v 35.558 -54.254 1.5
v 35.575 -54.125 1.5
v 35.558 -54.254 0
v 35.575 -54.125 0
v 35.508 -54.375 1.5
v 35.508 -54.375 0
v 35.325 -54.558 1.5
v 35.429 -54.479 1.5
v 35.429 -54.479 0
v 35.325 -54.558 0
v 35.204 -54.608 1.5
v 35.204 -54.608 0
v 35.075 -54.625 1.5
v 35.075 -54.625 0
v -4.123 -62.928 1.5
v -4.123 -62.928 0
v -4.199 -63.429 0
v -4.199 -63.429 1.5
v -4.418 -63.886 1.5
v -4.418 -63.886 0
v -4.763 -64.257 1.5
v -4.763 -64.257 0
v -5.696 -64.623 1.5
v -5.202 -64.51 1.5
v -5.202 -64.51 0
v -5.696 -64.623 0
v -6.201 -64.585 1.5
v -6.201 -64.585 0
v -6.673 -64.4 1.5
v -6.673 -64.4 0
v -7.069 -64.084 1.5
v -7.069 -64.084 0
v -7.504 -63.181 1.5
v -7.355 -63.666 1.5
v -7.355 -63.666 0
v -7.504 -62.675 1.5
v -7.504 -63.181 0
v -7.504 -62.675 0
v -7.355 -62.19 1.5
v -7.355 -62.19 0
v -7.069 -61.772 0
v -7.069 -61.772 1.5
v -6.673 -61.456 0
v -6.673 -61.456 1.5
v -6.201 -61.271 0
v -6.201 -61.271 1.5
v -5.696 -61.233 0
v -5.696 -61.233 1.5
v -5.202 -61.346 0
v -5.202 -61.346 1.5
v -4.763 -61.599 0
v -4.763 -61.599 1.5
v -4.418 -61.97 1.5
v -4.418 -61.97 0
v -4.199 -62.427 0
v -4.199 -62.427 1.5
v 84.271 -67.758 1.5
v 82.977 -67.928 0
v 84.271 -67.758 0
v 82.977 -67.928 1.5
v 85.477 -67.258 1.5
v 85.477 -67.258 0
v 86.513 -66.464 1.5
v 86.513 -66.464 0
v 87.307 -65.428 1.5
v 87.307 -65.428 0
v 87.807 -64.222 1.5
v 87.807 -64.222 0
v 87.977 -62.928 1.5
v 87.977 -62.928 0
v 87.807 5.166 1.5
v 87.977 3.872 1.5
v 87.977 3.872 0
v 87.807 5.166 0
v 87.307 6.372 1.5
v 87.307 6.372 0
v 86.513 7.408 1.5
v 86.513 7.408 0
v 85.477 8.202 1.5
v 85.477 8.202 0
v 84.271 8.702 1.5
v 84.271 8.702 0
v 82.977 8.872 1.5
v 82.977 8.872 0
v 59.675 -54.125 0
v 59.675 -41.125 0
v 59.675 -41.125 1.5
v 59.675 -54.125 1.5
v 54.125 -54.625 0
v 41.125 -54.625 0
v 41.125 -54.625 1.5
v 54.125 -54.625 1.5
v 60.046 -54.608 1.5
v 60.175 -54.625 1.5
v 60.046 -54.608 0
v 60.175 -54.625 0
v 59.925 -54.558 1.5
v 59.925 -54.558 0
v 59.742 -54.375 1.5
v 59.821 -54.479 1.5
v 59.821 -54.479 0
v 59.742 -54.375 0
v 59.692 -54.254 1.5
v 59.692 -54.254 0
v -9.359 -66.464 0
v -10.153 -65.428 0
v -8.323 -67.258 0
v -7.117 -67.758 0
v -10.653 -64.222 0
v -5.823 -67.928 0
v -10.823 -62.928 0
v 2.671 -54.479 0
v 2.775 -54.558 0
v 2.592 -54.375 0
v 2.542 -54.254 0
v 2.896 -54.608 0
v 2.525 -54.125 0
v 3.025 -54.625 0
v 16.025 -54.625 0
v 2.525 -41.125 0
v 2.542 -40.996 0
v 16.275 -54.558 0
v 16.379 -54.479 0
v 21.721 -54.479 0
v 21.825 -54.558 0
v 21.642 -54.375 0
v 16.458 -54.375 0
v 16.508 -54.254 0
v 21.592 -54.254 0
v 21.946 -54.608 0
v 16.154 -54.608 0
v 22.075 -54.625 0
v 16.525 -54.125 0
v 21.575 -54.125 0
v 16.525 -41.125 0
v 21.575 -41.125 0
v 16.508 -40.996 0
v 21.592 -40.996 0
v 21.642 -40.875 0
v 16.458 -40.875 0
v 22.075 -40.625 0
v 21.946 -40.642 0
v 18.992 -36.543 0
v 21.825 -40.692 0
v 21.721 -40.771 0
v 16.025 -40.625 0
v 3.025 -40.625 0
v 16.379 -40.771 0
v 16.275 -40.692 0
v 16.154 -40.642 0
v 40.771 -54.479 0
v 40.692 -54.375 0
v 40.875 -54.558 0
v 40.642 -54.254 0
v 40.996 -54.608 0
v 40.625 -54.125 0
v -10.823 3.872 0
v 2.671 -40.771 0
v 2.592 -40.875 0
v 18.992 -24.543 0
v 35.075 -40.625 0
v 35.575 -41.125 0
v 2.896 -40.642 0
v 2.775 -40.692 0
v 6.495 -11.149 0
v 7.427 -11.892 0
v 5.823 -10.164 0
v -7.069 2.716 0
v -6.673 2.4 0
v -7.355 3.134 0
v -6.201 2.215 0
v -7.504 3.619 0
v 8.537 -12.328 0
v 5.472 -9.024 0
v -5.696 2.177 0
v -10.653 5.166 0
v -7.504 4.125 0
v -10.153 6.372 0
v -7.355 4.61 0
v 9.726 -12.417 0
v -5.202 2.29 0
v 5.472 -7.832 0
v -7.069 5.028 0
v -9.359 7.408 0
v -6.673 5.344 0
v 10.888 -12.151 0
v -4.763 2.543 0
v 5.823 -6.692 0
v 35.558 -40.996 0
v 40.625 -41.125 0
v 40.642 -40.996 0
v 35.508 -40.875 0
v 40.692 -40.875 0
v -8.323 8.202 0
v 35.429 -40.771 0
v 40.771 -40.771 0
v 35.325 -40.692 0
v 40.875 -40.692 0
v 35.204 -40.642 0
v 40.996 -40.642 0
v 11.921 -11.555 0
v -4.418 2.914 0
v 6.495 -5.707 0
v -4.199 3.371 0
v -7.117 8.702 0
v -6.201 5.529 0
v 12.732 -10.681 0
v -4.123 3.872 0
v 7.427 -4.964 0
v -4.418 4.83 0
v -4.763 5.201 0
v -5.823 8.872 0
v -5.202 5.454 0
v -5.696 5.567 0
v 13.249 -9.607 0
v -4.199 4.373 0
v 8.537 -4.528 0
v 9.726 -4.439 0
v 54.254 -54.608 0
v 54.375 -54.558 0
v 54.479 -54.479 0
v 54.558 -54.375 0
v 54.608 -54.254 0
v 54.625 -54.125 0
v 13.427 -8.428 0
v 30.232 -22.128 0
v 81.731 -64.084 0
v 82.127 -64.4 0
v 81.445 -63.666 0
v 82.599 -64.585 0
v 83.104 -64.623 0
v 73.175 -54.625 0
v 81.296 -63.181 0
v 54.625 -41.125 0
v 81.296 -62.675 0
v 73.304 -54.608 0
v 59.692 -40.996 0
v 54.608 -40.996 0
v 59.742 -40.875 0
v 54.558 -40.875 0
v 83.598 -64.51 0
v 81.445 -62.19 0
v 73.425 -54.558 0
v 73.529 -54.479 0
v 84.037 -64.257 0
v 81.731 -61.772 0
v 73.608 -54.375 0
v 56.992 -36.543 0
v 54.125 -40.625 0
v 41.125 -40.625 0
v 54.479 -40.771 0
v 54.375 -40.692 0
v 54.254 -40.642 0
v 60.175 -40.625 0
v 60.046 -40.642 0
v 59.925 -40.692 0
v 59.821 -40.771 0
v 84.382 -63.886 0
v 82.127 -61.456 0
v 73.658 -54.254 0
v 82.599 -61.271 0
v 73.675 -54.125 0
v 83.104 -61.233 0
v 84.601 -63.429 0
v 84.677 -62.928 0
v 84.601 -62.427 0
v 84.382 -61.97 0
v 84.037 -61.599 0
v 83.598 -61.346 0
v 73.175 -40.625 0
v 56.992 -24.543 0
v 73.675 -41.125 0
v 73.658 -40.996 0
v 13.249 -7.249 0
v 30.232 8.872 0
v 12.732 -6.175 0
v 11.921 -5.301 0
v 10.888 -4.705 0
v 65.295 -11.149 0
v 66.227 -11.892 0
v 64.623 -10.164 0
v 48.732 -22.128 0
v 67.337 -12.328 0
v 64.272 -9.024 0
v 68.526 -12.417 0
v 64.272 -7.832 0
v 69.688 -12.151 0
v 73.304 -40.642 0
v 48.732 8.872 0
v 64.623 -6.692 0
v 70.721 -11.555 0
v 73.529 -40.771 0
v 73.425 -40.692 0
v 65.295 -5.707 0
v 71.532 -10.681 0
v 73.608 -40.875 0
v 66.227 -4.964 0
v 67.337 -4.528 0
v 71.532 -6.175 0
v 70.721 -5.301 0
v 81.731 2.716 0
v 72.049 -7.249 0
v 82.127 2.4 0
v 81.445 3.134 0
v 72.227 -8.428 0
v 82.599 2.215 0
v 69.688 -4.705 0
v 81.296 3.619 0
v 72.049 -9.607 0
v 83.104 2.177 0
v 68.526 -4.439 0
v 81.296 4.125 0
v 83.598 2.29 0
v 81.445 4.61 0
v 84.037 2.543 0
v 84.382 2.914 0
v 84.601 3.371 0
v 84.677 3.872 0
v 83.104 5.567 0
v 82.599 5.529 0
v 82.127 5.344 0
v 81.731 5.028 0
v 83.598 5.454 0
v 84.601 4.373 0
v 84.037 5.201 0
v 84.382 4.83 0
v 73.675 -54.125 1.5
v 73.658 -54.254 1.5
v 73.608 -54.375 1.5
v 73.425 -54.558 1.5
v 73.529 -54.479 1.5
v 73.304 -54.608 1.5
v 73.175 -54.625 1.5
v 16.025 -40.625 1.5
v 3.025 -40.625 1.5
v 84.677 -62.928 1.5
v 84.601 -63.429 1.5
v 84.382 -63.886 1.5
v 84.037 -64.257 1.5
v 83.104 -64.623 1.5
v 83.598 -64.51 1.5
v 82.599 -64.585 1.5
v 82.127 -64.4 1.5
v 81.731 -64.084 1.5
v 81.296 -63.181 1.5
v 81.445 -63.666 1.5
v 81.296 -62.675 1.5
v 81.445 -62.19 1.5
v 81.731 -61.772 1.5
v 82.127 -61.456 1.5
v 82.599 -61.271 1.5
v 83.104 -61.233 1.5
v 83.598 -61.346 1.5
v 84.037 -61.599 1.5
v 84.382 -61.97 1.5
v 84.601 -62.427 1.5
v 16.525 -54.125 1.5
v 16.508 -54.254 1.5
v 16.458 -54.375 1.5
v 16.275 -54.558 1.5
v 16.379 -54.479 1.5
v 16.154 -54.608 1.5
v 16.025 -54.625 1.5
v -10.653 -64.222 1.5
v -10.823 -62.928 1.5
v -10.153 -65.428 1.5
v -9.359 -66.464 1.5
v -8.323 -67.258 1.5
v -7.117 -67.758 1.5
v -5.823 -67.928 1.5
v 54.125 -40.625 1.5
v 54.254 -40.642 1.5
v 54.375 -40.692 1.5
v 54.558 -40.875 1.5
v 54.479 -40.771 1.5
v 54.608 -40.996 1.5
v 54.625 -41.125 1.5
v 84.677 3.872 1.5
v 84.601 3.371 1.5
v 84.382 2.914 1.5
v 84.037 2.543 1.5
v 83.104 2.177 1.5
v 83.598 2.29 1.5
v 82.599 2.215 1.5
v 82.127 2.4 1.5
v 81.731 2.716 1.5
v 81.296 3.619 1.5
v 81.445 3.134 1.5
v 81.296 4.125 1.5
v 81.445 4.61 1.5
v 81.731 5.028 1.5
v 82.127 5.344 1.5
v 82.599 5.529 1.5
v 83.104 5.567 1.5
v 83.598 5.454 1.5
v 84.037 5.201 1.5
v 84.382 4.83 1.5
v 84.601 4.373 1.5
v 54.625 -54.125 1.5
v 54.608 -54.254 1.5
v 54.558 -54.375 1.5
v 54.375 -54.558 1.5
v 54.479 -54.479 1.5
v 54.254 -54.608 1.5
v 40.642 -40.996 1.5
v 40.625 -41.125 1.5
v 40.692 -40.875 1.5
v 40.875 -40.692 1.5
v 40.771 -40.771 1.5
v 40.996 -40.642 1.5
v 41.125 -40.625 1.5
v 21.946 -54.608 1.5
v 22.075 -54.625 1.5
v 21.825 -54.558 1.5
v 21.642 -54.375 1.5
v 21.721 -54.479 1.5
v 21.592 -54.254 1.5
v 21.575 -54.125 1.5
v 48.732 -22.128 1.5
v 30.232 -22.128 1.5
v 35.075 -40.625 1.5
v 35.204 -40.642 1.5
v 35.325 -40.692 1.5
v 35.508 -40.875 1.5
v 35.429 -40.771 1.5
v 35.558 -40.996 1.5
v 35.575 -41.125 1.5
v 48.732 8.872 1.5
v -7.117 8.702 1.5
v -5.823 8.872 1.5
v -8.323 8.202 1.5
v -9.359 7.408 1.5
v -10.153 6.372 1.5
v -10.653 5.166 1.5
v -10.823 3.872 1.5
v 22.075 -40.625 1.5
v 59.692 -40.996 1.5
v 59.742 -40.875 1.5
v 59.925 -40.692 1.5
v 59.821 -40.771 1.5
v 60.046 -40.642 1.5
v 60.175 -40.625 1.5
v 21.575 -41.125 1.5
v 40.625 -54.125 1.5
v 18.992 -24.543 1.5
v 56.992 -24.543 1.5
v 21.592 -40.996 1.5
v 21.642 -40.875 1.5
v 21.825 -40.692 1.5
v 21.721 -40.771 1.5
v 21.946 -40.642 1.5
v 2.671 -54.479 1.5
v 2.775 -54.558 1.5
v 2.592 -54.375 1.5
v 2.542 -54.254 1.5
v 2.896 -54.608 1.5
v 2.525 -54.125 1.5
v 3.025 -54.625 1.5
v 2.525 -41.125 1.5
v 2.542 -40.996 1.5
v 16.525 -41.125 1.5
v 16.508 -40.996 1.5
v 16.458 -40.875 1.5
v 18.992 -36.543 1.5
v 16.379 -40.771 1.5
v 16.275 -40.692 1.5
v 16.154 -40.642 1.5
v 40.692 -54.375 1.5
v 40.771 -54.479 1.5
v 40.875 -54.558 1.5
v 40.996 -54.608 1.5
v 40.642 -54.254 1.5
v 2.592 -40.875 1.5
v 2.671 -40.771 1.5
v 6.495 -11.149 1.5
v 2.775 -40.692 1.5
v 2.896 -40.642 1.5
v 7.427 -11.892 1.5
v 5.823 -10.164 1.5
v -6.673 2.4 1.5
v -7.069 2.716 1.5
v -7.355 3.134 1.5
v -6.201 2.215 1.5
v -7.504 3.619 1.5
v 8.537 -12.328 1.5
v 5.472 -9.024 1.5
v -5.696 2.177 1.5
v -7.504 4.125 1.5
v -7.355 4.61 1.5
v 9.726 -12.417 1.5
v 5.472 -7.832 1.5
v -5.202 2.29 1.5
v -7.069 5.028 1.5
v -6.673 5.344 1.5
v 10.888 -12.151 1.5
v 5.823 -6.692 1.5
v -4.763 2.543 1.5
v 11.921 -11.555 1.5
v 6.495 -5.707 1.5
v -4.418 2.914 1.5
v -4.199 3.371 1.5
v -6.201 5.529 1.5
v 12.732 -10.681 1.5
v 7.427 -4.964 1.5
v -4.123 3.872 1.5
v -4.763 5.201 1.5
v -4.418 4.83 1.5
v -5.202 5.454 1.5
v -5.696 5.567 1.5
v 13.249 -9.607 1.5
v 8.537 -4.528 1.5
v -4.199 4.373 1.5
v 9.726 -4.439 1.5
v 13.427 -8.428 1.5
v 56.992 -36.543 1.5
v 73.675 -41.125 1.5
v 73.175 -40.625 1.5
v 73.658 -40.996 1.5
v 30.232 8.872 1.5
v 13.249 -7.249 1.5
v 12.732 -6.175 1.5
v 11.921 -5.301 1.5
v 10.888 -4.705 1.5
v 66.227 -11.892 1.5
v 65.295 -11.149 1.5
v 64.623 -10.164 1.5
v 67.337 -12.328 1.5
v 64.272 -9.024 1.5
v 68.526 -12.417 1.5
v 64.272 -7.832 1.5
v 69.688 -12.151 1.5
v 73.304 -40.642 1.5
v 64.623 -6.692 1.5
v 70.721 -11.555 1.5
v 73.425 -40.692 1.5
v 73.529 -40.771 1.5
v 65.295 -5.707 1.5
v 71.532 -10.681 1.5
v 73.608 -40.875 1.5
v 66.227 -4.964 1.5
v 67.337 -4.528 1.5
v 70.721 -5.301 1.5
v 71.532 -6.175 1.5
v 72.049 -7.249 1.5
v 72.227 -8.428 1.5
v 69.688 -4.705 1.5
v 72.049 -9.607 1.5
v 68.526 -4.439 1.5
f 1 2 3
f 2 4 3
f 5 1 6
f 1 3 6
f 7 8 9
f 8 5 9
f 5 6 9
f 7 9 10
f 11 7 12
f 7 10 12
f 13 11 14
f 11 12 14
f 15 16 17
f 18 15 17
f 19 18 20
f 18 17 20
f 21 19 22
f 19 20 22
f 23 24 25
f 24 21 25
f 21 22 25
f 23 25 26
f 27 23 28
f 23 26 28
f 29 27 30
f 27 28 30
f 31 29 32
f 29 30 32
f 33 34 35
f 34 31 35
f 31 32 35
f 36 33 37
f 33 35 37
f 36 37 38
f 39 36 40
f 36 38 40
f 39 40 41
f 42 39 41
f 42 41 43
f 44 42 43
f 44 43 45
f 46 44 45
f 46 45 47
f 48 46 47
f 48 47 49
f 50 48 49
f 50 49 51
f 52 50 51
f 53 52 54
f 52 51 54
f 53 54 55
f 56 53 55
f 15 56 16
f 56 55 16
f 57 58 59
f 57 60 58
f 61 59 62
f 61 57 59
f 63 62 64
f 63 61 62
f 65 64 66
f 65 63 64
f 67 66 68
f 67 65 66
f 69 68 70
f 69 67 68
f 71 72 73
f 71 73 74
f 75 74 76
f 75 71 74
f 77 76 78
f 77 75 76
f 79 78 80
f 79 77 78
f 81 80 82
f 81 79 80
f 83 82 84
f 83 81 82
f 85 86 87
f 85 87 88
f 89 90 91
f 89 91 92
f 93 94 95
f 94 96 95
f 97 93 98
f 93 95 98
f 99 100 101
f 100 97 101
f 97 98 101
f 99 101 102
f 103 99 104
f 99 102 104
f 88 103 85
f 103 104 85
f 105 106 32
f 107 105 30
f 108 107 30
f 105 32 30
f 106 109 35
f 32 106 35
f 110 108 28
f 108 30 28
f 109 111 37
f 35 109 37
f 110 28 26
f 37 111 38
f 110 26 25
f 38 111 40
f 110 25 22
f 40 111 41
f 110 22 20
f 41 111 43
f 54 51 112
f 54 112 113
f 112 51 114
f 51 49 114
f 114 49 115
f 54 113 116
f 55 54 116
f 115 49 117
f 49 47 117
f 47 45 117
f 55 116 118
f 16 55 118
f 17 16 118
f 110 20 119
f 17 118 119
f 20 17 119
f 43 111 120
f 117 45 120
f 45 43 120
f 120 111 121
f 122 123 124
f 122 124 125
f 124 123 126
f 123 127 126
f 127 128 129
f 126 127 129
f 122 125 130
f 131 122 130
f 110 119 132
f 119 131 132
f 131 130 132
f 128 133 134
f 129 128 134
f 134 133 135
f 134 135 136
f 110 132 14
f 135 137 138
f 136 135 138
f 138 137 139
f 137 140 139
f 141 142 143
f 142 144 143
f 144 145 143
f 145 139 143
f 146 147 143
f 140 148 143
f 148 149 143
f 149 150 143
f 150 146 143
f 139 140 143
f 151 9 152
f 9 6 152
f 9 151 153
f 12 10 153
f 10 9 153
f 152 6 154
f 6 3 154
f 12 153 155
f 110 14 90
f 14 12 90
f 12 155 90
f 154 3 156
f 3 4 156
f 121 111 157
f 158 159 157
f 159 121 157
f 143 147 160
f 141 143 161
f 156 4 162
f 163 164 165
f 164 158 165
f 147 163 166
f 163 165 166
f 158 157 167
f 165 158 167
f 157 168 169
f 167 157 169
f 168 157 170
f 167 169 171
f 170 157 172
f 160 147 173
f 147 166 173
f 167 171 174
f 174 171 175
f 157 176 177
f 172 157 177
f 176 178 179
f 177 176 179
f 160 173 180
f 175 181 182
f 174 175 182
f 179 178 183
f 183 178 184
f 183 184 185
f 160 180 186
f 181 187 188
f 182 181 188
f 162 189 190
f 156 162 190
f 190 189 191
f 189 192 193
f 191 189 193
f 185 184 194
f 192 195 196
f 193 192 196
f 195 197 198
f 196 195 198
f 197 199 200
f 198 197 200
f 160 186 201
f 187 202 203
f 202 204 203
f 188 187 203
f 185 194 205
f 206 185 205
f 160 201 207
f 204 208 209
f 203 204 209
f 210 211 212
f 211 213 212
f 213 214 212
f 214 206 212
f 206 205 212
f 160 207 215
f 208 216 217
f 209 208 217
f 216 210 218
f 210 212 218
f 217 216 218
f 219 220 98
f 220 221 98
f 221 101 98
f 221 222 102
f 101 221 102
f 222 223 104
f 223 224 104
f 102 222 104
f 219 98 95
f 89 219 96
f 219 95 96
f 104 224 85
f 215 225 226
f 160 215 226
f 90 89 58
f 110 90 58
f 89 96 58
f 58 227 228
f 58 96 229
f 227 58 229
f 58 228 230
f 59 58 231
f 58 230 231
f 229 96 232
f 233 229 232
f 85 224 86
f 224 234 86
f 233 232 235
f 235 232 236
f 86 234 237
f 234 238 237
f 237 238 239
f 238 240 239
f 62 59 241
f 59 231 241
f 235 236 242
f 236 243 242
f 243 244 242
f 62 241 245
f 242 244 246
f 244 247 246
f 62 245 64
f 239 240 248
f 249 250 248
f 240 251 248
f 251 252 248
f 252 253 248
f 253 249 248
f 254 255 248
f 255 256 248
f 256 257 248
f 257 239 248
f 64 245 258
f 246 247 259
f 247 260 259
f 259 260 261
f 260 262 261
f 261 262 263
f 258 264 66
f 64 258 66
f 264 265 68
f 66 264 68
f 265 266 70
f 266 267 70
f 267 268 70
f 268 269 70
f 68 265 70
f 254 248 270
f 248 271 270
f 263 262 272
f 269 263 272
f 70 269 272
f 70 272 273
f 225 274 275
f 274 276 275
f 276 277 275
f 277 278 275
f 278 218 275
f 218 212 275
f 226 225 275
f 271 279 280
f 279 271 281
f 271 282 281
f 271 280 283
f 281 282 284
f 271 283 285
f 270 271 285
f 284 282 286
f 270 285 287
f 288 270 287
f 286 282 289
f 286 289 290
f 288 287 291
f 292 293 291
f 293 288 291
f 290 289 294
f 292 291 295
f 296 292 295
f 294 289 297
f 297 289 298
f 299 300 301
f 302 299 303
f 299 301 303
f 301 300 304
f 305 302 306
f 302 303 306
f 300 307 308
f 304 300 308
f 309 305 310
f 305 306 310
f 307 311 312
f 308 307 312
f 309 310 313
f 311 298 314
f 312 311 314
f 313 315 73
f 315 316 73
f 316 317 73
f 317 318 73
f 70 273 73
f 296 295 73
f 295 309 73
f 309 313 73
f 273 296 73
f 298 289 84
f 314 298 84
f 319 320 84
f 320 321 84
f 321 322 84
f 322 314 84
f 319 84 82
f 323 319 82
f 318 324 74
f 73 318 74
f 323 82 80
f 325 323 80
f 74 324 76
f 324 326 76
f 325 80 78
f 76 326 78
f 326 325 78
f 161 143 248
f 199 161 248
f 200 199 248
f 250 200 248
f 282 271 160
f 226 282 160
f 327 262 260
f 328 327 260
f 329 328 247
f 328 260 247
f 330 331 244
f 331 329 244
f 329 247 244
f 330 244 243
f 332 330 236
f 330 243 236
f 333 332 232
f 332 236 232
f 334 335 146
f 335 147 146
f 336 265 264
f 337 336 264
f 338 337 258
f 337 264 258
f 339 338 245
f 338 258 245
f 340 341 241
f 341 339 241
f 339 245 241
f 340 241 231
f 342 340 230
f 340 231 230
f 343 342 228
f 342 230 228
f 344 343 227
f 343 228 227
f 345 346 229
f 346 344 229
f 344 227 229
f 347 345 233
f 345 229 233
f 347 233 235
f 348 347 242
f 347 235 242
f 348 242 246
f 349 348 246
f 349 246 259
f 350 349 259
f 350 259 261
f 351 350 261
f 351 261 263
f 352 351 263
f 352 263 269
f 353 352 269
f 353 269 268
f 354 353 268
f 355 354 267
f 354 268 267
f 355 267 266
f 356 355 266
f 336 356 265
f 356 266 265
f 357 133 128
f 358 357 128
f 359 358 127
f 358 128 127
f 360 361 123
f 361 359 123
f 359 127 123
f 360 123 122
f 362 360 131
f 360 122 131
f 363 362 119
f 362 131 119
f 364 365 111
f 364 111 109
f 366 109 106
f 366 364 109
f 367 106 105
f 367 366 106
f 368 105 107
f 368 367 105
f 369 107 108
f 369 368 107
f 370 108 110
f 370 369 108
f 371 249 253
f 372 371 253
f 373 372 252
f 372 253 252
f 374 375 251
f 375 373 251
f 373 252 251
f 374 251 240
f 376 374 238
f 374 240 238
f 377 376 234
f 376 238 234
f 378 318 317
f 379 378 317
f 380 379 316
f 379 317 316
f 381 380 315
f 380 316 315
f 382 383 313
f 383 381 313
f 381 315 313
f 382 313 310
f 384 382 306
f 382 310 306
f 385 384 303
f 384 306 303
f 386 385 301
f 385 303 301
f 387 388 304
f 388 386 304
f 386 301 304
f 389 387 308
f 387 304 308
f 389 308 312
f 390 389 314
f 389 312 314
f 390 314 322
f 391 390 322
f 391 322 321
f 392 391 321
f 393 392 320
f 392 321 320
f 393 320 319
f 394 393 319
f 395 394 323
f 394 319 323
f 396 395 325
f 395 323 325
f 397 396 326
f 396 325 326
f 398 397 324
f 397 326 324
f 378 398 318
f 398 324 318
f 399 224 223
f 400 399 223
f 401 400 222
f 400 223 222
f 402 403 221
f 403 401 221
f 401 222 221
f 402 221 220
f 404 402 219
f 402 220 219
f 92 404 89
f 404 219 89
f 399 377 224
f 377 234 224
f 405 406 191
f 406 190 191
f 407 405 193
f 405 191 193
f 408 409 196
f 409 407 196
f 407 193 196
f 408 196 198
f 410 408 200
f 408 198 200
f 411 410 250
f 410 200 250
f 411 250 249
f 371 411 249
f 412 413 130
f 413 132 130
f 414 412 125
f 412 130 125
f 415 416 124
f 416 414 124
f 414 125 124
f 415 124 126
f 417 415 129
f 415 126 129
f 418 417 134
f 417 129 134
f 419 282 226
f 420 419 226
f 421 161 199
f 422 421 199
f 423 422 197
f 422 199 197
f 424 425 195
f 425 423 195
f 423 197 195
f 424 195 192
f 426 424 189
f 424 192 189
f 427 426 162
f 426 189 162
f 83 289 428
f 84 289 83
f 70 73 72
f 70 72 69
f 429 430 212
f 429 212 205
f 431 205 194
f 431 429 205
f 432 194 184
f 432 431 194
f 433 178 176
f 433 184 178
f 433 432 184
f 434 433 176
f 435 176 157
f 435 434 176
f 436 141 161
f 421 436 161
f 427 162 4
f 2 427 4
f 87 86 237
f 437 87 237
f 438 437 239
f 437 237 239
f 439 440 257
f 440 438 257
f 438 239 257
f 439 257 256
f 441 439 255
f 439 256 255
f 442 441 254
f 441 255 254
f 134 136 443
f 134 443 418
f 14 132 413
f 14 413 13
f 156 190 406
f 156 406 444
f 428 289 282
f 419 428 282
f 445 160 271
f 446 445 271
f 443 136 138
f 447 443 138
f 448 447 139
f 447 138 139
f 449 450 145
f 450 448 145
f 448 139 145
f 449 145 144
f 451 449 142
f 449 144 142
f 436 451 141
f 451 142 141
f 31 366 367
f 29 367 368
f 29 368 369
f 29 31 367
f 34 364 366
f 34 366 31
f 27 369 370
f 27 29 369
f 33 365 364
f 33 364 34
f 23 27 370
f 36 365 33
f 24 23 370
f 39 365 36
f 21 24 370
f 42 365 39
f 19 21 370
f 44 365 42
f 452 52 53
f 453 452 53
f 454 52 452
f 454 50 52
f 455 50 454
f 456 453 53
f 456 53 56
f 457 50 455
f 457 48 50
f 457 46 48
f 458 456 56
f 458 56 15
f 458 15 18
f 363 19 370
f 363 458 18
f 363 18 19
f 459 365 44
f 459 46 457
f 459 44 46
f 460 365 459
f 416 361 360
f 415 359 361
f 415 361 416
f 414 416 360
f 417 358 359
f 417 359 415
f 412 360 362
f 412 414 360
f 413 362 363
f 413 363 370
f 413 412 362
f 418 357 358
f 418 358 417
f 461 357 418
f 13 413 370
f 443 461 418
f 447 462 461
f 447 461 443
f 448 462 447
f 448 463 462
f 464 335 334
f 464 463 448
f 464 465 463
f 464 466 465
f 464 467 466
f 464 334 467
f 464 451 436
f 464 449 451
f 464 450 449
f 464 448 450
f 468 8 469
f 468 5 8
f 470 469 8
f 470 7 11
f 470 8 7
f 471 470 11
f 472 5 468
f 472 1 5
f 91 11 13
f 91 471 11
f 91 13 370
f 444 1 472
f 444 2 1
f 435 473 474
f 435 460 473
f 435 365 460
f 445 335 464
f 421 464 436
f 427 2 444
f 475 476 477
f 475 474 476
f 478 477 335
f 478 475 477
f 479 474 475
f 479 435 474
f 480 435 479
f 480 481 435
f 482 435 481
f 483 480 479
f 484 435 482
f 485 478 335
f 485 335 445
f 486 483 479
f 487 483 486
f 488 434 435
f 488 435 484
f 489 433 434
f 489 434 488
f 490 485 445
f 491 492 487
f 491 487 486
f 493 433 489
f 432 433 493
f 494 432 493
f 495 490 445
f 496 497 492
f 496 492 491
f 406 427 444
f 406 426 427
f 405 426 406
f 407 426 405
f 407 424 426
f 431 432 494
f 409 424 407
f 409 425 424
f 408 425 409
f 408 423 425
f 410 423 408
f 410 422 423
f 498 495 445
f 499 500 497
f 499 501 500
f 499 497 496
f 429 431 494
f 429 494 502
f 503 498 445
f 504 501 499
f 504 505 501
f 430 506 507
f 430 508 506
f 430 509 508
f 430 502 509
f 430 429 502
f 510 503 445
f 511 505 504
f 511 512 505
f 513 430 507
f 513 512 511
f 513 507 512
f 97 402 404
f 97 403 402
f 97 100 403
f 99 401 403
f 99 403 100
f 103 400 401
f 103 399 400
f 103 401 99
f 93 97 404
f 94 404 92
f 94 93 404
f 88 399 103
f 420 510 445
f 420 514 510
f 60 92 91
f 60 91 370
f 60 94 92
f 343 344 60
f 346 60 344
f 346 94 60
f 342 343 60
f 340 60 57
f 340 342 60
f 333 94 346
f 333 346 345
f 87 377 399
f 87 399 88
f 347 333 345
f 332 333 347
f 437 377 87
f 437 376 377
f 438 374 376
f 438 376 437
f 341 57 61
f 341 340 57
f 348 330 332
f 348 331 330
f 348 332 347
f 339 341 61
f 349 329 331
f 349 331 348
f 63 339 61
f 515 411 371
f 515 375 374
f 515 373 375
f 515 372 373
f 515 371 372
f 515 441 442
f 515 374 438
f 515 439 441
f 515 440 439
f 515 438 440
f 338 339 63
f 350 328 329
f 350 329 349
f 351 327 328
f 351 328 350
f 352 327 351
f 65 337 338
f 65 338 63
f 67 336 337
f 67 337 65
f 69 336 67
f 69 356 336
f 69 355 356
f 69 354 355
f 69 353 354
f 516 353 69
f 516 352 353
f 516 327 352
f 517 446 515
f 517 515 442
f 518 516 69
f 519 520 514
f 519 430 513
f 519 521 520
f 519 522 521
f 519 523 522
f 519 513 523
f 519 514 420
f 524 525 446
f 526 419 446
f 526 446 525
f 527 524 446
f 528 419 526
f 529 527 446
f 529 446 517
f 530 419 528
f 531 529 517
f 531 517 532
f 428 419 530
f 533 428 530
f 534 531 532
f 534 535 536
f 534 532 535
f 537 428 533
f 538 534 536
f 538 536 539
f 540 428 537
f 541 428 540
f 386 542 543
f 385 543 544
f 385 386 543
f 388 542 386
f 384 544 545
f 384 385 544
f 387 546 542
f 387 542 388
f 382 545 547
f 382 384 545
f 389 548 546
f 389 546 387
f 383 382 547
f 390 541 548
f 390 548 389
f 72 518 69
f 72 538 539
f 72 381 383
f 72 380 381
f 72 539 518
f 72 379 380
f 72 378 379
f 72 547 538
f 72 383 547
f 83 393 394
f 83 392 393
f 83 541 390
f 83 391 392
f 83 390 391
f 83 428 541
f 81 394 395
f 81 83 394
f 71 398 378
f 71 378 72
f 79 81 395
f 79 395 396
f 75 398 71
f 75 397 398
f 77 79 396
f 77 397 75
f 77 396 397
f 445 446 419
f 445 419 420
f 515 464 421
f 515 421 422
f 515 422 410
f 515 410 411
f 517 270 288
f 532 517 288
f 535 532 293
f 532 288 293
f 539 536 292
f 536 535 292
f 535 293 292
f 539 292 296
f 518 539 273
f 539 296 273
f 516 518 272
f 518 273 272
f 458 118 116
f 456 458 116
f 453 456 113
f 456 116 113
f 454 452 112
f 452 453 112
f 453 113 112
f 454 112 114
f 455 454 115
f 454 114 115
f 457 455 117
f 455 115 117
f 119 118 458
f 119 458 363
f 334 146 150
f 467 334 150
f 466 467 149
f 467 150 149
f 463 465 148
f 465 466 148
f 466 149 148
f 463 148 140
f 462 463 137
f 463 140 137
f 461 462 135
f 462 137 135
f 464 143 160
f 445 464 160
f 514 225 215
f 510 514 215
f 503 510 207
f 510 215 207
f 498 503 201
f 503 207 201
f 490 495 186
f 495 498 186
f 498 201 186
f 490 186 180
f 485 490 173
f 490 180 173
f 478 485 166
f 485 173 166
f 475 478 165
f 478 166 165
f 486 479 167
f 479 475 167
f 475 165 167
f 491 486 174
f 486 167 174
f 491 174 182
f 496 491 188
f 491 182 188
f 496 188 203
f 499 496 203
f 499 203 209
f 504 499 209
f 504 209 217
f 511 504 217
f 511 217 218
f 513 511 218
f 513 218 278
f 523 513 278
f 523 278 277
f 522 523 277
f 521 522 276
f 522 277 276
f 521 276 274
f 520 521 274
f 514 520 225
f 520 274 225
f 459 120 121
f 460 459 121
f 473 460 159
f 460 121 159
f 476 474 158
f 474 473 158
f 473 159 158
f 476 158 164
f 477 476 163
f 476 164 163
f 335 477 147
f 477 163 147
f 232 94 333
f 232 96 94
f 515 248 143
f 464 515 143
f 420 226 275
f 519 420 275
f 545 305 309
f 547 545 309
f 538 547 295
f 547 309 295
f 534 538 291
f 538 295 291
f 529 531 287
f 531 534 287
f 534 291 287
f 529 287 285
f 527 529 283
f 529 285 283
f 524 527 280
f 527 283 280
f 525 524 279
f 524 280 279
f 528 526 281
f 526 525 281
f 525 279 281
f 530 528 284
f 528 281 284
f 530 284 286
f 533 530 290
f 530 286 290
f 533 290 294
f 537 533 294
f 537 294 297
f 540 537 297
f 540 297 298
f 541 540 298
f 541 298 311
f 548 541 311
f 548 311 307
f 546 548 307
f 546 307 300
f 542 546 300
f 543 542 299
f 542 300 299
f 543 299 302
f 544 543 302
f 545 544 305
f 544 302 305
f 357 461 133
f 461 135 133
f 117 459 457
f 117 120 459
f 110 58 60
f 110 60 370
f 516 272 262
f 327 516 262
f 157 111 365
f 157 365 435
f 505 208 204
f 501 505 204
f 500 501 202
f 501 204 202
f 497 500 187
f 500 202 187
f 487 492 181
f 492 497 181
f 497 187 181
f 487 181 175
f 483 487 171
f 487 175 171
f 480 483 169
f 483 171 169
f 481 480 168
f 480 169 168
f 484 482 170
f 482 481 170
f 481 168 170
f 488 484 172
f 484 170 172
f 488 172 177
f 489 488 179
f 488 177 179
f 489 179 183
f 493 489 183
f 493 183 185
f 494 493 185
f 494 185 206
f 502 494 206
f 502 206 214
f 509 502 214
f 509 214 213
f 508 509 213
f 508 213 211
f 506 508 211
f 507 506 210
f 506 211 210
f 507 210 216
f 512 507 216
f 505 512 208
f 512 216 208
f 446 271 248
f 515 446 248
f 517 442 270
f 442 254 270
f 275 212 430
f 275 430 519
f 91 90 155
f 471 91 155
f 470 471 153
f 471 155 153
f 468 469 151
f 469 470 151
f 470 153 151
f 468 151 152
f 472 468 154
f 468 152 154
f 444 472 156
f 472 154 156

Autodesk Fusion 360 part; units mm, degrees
sketch "plate-2026-01-04T06_23_53.757Z" plane through (0, 0, 0) normal (0, 0, 1) x (1, 0, 0)
  line L0 (3.025, -40.625) -> (16.025, -40.625)
  line L1 (3.025, -54.625) -> (16.025, -54.625)
  line L2 (2.525, -41.125) -> (2.525, -54.125)
  line L3 (16.525, -41.125) -> (16.525, -54.125)
  arc A0 (3.025, -40.625) -> (2.525, -41.125) centre (3.025, -41.125) ccw
  arc A1 (16.525, -41.125) -> (16.025, -40.625) centre (16.025, -41.125) ccw
  arc A2 (2.525, -54.125) -> (3.025, -54.625) centre (3.025, -54.125) ccw
  arc A3 (16.025, -54.625) -> (16.525, -54.125) centre (16.025, -54.125) ccw
  line L4 (22.075, -40.625) -> (35.075, -40.625)
  line L5 (22.075, -54.625) -> (35.075, -54.625)
  line L6 (21.575, -41.125) -> (21.575, -54.125)
  line L7 (35.575, -41.125) -> (35.575, -54.125)
  arc A4 (22.075, -40.625) -> (21.575, -41.125) centre (22.075, -41.125) ccw
  arc A5 (35.575, -41.125) -> (35.075, -40.625) centre (35.075, -41.125) ccw
  arc A6 (21.575, -54.125) -> (22.075, -54.625) centre (22.075, -54.125) ccw
  arc A7 (35.075, -54.625) -> (35.575, -54.125) centre (35.075, -54.125) ccw
  line L8 (41.125, -40.625) -> (54.125, -40.625)
  line L9 (41.125, -54.625) -> (54.125, -54.625)
  line L10 (40.625, -41.125) -> (40.625, -54.125)
  line L11 (54.625, -41.125) -> (54.625, -54.125)
  arc A8 (41.125, -40.625) -> (40.625, -41.125) centre (41.125, -41.125) ccw
  arc A9 (54.625, -41.125) -> (54.125, -40.625) centre (54.125, -41.125) ccw
  arc A10 (40.625, -54.125) -> (41.125, -54.625) centre (41.125, -54.125) ccw
  arc A11 (54.125, -54.625) -> (54.625, -54.125) centre (54.125, -54.125) ccw
  line L12 (60.175, -40.625) -> (73.175, -40.625)
  line L13 (60.175, -54.625) -> (73.175, -54.625)
  line L14 (59.675, -41.125) -> (59.675, -54.125)
  line L15 (73.675, -41.125) -> (73.675, -54.125)
  arc A12 (60.175, -40.625) -> (59.675, -41.125) centre (60.175, -41.125) ccw
  arc A13 (73.675, -41.125) -> (73.175, -40.625) centre (73.175, -41.125) ccw
  arc A14 (59.675, -54.125) -> (60.175, -54.625) centre (60.175, -54.125) ccw
  arc A15 (73.175, -54.625) -> (73.675, -54.125) centre (73.175, -54.125) ccw
  line L16 (-10.823, 8.872) -> (87.977, 8.872)
  line L17 (87.977, 8.872) -> (87.977, -67.928)
  line L18 (87.977, -67.928) -> (-10.823, -67.928)
  line L19 (-10.823, -67.928) -> (-10.823, 8.872)
  circle A16 centre (-5.823, 3.872) radius 1.7
  circle A17 centre (82.977, 3.872) radius 1.7
  circle A18 centre (82.977, -62.928) radius 1.7
  circle A19 centre (-5.823, -62.928) radius 1.7
  line L20 (30.232, 8.872) -> (48.732, 8.872)
  line L21 (48.732, 8.872) -> (48.732, -22.128)
  line L22 (48.732, -22.128) -> (30.232, -22.128)
  line L23 (30.232, -22.128) -> (30.232, 8.872)
  circle A20 centre (9.427, -8.428) radius 4
  circle A21 centre (68.227, -8.428) radius 4
  line L24 (18.992, -24.543) -> (56.992, -24.543)
  line L25 (56.992, -24.543) -> (56.992, -36.543)
  line L26 (56.992, -36.543) -> (18.992, -36.543)
  line L27 (18.992, -36.543) -> (18.992, -24.543)
  dimension "d1" = 76.8
  dimension "d2" = 98.8
  dimension "d3" = 13.348
  dimension "d4" = 13.303
  dimension "d5" = 3.4
  dimension "d6" = 5
  dimension "d7" = 5
  dimension "d8" = 3.4
  dimension "d9" = 5
  dimension "d10" = 5
  dimension "d11" = 3.4
  dimension "d12" = 5
  dimension "d13" = 5
  dimension "d14" = 3.4
  dimension "d15" = 5
  dimension "d16" = 5
  dimension "d17" = 31
  dimension "d18" = 18.5
  dimension "d19" = 41.055
  dimension "d20" = 8
  dimension "d21" = 17.3
  dimension "d22" = 20.25
  dimension "d23" = 8
  dimension "d24" = 17.3
  dimension "d25" = 19.75
  dimension "d26" = 12
  dimension "d27" = 38
  dimension "d28" = 29.815
  dimension "d29" = 31.385
extrude "Extrude1" add sketch "plate-2026-01-04T06_23_53.757Z" along normal blind 1.5 contours L16 L17 L18 L19 L21 L22 L23
fillet "Fillet1" radius 5 1 edges at (87.977, 8.872, 0.75)
fillet "Fillet2" radius 5 1 edges at (-10.823, 8.872, 0.75)
fillet "Fillet3" radius 5 1 edges at (-10.823, -67.928, 0.75)
fillet "Fillet4" radius 5 1 edges at (87.977, -67.928, 0.75)
equation "d3 = 9.5 mm + 3.848 mm"
equation "d4 = 3.803 mm + 9.5 mm"
equation "d19 = 35.305 mm + 5.75 mm"
equation "d21 = 7.8 mm + 9.5 mm"
equation "d22 = 9.5 mm + 10.75 mm"
equation "d24 = 9.5 mm + 7.8 mm"
equation "d25 = 9.5 mm + 10.250 mm"
equation "d28 = 9.5 mm + 20.315 mm"
equation "d29 = 21.885 mm + 9.5 mm"
